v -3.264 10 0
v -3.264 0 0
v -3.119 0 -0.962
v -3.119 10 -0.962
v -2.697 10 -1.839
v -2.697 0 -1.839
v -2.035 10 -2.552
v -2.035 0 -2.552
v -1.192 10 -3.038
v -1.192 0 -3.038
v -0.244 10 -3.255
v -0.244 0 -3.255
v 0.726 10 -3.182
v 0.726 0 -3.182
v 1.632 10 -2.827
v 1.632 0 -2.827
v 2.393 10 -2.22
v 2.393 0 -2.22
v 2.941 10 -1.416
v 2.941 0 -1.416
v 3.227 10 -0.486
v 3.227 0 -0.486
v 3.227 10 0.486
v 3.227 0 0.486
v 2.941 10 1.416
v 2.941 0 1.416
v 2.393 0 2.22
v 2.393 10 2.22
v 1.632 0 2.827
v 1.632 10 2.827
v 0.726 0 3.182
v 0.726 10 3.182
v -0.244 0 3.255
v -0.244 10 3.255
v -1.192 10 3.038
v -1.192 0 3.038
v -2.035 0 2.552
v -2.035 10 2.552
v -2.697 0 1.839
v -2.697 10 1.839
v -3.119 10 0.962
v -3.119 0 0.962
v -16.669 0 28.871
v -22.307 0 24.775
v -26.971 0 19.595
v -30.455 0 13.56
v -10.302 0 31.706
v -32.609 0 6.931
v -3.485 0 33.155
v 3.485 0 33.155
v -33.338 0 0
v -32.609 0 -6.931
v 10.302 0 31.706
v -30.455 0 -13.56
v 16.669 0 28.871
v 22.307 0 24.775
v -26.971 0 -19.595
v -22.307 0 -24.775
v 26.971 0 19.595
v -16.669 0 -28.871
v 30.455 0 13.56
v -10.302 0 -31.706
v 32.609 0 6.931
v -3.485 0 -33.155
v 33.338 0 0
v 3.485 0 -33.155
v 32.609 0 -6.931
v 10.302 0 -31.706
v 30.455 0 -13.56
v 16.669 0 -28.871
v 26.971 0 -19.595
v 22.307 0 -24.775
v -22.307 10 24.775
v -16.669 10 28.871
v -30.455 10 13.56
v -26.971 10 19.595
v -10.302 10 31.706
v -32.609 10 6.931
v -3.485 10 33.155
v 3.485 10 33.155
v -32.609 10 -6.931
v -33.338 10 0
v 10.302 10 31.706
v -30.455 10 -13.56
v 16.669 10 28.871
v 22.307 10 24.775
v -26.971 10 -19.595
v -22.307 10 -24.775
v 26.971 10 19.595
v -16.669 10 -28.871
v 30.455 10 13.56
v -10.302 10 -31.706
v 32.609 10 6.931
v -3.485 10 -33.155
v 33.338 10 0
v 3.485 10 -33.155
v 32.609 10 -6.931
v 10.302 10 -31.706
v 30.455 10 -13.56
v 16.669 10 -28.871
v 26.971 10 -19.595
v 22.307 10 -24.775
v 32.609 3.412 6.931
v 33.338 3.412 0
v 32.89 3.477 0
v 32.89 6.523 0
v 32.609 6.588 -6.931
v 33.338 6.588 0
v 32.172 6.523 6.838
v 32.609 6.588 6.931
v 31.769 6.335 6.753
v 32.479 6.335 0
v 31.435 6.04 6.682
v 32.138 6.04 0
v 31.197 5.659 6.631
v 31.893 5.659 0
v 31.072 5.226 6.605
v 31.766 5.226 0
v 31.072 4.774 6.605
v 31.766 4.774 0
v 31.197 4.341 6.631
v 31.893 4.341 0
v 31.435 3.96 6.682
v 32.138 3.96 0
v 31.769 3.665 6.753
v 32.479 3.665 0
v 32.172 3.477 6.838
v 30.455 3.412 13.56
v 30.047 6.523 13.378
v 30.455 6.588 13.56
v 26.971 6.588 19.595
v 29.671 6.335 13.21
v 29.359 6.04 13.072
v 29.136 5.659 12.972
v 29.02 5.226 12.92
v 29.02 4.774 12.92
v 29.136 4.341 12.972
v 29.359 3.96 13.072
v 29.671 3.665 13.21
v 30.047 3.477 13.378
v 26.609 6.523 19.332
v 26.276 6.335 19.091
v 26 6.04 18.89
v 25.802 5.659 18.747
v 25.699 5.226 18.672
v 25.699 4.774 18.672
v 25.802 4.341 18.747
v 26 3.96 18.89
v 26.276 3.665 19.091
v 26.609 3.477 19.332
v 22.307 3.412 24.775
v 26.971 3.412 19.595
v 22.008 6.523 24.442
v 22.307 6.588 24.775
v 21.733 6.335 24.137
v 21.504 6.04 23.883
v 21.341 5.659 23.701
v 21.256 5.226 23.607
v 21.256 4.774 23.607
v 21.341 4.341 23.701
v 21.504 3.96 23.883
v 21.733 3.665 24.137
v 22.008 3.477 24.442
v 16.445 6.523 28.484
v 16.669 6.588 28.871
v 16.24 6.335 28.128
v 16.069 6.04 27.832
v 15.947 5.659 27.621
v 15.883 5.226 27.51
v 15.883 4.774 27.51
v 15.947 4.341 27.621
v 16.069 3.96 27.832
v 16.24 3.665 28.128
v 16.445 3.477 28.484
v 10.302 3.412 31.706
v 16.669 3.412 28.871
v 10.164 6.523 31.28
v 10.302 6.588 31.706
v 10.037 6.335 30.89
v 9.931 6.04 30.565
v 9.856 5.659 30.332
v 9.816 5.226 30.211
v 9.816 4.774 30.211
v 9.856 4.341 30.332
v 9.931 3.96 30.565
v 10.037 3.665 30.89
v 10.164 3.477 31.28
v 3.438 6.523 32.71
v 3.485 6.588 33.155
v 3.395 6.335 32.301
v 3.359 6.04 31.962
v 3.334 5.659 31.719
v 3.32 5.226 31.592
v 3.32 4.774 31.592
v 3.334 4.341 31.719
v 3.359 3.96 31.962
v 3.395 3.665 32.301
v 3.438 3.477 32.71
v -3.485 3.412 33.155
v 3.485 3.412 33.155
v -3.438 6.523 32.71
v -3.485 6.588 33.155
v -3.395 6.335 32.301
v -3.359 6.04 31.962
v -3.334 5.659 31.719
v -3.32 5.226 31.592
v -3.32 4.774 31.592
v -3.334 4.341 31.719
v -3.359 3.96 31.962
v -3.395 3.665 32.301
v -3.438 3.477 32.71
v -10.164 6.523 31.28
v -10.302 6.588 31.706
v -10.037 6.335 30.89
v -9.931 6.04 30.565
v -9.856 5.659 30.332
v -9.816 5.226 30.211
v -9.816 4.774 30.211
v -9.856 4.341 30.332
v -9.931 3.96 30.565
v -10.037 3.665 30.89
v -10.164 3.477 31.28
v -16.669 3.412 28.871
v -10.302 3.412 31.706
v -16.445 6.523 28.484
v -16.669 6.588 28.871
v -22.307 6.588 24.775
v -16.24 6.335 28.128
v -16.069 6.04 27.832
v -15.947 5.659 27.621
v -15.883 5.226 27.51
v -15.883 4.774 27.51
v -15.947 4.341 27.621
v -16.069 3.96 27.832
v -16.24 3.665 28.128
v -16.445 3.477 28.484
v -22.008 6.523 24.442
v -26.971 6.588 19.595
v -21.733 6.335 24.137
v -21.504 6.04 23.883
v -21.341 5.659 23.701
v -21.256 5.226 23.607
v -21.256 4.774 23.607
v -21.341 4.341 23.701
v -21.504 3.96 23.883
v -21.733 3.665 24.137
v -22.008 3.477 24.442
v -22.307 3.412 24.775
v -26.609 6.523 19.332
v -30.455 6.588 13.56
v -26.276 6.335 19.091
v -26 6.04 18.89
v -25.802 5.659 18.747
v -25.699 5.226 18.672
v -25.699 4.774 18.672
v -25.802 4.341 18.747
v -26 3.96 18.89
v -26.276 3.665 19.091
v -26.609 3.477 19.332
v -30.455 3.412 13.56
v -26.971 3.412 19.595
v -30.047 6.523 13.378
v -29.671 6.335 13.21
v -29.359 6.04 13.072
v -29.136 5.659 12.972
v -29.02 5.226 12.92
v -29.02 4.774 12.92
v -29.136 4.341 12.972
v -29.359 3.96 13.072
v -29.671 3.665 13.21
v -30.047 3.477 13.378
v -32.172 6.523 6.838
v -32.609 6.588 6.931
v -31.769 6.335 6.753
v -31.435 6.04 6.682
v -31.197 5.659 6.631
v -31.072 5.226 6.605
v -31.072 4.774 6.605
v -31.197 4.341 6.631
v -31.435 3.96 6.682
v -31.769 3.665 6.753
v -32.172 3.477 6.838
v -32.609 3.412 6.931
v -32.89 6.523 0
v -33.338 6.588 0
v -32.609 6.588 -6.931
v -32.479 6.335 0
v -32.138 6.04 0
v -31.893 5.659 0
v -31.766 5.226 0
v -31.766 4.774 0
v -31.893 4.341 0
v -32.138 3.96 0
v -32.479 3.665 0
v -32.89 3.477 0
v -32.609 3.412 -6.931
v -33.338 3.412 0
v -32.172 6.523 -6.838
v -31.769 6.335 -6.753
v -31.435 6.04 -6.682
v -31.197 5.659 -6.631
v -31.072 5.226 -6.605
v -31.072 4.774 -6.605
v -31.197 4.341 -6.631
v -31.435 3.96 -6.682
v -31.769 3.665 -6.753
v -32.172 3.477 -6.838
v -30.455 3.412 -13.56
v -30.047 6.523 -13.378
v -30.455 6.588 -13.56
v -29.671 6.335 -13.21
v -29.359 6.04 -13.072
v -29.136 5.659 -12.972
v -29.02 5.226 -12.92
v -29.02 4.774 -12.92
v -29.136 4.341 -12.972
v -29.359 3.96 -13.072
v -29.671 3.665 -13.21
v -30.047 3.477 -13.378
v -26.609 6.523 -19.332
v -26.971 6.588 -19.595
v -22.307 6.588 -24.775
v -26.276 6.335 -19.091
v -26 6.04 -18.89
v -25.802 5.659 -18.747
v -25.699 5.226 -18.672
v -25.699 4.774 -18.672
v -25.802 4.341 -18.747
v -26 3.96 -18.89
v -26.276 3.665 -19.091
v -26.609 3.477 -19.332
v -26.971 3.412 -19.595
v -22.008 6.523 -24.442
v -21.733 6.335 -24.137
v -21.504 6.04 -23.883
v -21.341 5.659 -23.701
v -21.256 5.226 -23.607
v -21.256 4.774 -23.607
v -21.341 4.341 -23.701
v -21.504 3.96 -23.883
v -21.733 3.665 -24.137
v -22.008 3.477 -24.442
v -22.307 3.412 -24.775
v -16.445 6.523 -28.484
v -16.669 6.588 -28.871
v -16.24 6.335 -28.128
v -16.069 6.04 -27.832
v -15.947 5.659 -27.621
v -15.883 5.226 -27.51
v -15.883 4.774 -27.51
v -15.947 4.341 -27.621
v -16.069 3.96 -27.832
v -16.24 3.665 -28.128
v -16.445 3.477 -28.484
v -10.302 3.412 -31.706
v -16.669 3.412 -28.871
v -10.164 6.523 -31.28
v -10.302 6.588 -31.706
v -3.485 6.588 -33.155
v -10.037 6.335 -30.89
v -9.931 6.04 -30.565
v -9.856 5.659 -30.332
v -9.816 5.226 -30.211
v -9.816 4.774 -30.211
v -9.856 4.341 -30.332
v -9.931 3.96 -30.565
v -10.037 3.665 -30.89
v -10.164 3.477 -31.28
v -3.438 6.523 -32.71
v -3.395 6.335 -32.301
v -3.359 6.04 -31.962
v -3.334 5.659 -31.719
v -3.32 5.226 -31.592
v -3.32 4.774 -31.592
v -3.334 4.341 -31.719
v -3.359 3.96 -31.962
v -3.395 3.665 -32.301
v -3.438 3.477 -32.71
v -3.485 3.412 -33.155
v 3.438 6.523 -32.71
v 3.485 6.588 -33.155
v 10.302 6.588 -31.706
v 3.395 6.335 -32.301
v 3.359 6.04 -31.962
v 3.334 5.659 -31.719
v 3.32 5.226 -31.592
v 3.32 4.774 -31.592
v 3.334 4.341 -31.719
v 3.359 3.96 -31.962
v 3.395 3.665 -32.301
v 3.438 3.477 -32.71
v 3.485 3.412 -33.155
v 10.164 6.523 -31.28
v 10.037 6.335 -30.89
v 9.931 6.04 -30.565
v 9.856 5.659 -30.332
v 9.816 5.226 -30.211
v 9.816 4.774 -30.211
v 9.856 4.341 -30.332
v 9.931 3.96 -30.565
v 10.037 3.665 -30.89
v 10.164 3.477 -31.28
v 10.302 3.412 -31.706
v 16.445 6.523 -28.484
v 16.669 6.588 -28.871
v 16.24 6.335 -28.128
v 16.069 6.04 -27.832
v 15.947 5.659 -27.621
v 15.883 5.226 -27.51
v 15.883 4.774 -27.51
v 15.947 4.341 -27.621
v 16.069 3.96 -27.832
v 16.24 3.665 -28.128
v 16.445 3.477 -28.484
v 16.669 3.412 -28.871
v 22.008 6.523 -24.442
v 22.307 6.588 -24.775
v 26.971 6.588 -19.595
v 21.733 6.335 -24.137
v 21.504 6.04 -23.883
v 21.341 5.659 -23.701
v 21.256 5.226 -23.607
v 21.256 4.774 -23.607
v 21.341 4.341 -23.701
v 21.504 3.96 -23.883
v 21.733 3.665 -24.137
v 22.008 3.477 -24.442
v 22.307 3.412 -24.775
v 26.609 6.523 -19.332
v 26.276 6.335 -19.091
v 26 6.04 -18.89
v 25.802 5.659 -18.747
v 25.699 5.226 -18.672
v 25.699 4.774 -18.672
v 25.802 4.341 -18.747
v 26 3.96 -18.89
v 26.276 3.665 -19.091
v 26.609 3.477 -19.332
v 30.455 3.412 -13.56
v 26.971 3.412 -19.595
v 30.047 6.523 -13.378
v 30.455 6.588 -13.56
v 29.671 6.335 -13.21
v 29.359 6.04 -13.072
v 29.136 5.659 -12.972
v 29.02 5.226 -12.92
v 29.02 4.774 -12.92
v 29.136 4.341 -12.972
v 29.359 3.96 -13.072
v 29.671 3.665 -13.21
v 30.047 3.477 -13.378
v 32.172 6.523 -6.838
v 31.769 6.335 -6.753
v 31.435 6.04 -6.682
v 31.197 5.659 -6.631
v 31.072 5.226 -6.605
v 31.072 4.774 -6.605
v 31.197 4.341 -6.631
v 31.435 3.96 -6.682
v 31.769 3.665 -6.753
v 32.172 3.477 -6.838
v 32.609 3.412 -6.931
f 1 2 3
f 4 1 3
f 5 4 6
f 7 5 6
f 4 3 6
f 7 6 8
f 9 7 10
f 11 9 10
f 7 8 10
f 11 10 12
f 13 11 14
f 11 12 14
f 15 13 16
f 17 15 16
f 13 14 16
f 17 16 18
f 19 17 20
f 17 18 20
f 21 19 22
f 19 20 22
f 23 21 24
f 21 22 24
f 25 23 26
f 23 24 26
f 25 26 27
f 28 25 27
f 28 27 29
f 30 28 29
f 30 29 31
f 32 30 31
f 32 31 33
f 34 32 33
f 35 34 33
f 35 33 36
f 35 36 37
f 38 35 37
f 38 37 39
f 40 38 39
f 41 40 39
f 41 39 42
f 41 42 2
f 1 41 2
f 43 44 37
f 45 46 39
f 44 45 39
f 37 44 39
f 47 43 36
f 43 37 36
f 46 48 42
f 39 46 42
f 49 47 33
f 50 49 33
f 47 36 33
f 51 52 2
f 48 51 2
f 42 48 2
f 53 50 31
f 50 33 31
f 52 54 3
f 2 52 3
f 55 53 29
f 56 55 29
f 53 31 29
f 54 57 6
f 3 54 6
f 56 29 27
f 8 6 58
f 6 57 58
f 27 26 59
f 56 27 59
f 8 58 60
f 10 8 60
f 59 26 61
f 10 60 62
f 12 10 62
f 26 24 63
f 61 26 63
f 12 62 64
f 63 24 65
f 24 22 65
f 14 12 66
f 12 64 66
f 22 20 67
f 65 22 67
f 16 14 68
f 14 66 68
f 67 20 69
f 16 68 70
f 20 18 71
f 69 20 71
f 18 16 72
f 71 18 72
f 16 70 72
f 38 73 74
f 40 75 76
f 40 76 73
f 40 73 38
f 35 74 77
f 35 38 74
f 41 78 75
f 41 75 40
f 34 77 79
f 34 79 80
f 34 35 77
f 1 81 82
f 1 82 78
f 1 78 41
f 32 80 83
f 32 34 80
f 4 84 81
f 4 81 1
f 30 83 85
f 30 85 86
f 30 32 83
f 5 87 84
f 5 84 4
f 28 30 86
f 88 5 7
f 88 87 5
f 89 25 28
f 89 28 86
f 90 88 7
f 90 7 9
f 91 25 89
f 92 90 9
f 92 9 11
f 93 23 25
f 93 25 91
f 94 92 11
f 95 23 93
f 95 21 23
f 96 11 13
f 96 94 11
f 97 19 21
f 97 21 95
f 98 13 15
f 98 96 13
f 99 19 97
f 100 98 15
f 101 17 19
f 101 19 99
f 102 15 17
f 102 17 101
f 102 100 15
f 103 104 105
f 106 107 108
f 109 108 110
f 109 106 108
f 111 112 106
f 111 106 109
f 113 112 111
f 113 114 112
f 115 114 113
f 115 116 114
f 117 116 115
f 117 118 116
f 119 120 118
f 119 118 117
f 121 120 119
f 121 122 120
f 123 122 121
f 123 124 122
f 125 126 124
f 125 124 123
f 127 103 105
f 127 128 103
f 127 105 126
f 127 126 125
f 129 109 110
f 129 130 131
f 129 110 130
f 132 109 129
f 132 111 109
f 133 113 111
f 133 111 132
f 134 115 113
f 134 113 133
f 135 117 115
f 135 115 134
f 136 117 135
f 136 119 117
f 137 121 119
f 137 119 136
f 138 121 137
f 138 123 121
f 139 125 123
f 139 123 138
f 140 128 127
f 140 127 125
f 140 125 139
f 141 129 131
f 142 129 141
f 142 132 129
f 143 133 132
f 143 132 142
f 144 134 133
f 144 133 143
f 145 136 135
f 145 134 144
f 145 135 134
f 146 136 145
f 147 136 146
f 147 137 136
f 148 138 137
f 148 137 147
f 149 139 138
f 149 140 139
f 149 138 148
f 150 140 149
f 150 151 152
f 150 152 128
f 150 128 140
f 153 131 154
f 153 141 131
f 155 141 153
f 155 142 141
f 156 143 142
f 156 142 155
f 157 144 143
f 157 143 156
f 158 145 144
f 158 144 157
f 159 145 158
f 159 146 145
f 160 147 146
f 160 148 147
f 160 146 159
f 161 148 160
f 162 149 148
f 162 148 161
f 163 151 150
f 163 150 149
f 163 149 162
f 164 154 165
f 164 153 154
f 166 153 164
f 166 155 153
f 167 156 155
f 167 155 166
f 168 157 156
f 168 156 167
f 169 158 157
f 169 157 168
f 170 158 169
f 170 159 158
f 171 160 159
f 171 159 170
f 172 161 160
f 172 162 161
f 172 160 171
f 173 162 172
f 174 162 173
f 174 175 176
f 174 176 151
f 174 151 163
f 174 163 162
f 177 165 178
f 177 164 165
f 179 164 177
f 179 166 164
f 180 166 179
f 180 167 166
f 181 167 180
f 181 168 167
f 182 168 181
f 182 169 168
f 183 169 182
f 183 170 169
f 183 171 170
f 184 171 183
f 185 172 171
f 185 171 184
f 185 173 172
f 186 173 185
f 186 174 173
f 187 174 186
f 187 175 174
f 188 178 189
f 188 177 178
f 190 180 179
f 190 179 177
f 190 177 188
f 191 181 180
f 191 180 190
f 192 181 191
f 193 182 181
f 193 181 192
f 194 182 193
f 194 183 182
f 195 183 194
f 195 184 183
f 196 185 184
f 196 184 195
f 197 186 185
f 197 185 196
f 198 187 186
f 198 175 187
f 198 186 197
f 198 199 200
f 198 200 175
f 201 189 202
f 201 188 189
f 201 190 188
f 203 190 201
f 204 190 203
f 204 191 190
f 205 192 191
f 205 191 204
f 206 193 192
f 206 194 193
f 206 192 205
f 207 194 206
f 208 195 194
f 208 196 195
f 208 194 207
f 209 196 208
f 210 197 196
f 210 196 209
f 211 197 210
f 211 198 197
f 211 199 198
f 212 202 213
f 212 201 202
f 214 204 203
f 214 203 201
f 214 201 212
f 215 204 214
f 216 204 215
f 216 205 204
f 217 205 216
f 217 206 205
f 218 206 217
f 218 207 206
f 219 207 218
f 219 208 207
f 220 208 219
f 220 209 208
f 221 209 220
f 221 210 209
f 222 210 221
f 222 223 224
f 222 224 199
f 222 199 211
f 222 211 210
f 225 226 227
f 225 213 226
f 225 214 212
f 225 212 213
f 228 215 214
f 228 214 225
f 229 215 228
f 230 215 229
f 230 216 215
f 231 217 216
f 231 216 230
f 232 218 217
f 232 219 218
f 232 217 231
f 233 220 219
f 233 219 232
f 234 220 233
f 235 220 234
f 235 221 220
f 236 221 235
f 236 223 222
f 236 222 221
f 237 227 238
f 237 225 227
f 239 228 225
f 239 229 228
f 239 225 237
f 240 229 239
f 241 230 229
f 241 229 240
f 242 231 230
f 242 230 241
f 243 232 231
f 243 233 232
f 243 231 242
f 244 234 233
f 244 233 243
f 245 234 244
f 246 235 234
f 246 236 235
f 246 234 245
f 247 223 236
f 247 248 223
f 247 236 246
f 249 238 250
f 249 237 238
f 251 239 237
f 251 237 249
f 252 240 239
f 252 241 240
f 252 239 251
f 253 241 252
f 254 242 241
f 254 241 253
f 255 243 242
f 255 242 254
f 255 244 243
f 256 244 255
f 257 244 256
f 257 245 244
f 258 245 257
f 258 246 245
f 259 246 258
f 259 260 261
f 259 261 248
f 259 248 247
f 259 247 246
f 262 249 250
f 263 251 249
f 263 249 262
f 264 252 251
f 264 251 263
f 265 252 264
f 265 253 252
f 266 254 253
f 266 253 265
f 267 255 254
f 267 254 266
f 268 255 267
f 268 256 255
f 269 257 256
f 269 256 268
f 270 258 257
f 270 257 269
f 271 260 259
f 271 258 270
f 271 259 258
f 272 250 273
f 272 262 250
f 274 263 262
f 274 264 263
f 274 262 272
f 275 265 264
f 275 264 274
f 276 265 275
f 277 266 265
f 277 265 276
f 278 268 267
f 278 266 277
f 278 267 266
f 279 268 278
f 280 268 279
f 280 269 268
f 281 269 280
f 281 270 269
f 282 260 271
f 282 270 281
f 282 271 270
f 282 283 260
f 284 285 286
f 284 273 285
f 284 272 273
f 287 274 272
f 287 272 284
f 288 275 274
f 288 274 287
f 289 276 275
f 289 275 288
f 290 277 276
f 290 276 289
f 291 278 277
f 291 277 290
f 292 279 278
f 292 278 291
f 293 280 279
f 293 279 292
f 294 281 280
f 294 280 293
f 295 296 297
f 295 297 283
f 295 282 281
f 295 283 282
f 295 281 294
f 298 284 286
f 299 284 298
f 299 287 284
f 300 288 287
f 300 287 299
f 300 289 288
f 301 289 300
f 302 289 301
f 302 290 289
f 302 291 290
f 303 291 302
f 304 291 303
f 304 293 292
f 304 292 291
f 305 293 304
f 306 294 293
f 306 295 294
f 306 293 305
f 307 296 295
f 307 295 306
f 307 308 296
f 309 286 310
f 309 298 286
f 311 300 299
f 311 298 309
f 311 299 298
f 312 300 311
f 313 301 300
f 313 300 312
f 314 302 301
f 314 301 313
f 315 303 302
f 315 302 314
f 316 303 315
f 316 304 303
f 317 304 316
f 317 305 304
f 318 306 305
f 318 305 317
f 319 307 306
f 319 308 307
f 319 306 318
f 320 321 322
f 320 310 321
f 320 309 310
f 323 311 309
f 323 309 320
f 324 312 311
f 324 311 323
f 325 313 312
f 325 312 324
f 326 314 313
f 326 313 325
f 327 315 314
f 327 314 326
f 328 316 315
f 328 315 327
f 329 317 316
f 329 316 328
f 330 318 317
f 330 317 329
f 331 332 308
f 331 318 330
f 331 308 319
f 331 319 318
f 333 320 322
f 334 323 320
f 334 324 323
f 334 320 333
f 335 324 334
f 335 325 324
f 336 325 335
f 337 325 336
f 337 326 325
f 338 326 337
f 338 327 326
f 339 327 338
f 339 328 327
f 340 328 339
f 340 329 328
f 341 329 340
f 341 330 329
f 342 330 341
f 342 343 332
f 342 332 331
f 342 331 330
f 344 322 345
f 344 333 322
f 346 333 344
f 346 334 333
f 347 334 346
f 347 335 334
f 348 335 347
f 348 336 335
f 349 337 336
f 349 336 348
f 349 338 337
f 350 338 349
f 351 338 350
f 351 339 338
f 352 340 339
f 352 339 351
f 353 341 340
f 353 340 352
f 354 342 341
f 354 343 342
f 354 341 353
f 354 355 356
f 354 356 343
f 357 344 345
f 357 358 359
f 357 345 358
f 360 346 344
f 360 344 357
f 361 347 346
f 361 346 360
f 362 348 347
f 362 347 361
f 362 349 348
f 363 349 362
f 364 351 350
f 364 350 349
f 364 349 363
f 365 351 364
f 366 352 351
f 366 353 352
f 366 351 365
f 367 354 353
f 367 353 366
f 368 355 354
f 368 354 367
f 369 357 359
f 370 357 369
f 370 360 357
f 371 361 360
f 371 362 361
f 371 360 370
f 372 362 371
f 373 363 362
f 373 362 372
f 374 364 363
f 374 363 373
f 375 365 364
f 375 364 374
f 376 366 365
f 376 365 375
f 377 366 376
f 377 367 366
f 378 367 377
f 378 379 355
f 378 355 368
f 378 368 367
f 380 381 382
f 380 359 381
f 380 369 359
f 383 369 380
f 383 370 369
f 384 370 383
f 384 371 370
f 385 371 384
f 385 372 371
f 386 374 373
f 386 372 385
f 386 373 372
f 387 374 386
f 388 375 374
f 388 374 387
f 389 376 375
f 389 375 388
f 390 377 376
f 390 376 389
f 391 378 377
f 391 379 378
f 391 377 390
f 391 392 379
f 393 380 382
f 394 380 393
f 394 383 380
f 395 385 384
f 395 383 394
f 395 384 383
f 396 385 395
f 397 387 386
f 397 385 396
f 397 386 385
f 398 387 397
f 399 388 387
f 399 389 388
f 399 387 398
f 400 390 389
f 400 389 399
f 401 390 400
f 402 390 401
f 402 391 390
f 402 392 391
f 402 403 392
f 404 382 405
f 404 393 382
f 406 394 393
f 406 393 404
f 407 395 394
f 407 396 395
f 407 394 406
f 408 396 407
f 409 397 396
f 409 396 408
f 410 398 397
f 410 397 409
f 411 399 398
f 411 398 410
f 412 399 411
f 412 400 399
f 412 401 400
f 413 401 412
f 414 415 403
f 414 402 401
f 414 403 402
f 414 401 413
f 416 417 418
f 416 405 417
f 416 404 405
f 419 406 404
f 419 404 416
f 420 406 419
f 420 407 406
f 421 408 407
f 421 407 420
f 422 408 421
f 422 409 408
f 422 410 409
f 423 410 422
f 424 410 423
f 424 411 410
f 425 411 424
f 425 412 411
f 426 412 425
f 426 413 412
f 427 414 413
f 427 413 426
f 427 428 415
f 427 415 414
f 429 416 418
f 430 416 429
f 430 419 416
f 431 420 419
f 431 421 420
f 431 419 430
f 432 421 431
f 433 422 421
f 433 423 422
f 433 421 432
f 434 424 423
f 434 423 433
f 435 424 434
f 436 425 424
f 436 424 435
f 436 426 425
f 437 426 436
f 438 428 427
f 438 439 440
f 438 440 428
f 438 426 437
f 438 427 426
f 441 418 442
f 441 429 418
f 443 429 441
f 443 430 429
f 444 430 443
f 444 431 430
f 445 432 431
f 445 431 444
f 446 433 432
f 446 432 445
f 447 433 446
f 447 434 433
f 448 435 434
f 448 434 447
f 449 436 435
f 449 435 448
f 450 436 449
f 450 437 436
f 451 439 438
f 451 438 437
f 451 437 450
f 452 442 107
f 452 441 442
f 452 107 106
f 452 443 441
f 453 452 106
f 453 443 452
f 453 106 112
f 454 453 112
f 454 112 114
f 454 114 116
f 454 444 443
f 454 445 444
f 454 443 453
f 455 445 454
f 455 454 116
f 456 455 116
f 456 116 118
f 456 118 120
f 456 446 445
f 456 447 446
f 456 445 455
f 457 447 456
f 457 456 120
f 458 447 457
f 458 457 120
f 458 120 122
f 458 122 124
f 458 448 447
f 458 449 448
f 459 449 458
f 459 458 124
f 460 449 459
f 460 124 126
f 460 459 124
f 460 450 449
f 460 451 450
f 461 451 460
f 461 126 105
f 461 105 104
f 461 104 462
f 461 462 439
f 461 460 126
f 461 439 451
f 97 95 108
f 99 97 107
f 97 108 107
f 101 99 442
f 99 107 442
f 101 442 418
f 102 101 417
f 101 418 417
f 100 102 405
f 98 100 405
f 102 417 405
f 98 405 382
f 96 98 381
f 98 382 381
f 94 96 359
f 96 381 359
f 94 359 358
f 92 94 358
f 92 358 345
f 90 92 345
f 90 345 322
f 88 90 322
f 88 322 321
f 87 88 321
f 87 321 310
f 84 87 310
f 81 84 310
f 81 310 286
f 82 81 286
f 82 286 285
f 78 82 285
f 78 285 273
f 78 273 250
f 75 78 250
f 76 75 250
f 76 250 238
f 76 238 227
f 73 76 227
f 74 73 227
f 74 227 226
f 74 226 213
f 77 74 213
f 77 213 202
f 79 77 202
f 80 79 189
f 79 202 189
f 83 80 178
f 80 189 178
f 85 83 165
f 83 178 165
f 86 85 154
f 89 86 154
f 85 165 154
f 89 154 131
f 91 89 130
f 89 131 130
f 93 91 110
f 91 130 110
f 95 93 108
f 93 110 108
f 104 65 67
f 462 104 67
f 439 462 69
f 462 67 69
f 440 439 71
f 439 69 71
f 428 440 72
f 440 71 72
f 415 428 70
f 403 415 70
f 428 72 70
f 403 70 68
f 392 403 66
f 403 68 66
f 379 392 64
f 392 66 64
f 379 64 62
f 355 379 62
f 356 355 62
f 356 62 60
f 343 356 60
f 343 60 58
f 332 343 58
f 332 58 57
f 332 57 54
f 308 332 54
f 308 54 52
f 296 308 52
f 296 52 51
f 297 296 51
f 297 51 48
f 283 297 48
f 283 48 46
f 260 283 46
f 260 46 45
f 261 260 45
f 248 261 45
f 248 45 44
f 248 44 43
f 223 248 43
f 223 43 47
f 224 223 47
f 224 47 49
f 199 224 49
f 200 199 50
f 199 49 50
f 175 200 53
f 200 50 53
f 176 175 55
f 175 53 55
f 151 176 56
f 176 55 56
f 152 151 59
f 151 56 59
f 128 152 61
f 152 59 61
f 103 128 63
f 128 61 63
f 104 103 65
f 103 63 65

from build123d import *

# Parameters (mm, degrees)
SKETCH1_R                = 33.3375
BOSS_EXTRUDE1_DEPTH      = 10
SKETCH2_R                = 1.5875
F_5_16_18_TAPPED_HOLE1_D = 6.5278


with BuildPart() as part:
    # Sketch1 → Boss-Extrude1 (new body)
    with BuildSketch(Plane(origin=(0, 0, 0), x_dir=(1, 0, 0), z_dir=(0, 1, 0))):
        Circle(SKETCH1_R)
    extrude(amount=BOSS_EXTRUDE1_DEPTH)

    # Sketch2 → Cut-Revolve1 (revolve, cut)
    with BuildSketch(Plane.XY):
        with Locations((33.3375, 5)):
            Circle(SKETCH2_R)
    revolve(axis=Axis((0, 10, 0), (0, -1, 0)), mode=Mode.SUBTRACT)

    # 5/16-18 Tapped Hole1 (through all)
    with Locations(Plane(origin=(0, 10, 0), x_dir=(1, 0, 0), z_dir=(0, 1, 0))):
        with Locations((0, 0)):
            Hole(F_5_16_18_TAPPED_HOLE1_D / 2)


solid = part.part
